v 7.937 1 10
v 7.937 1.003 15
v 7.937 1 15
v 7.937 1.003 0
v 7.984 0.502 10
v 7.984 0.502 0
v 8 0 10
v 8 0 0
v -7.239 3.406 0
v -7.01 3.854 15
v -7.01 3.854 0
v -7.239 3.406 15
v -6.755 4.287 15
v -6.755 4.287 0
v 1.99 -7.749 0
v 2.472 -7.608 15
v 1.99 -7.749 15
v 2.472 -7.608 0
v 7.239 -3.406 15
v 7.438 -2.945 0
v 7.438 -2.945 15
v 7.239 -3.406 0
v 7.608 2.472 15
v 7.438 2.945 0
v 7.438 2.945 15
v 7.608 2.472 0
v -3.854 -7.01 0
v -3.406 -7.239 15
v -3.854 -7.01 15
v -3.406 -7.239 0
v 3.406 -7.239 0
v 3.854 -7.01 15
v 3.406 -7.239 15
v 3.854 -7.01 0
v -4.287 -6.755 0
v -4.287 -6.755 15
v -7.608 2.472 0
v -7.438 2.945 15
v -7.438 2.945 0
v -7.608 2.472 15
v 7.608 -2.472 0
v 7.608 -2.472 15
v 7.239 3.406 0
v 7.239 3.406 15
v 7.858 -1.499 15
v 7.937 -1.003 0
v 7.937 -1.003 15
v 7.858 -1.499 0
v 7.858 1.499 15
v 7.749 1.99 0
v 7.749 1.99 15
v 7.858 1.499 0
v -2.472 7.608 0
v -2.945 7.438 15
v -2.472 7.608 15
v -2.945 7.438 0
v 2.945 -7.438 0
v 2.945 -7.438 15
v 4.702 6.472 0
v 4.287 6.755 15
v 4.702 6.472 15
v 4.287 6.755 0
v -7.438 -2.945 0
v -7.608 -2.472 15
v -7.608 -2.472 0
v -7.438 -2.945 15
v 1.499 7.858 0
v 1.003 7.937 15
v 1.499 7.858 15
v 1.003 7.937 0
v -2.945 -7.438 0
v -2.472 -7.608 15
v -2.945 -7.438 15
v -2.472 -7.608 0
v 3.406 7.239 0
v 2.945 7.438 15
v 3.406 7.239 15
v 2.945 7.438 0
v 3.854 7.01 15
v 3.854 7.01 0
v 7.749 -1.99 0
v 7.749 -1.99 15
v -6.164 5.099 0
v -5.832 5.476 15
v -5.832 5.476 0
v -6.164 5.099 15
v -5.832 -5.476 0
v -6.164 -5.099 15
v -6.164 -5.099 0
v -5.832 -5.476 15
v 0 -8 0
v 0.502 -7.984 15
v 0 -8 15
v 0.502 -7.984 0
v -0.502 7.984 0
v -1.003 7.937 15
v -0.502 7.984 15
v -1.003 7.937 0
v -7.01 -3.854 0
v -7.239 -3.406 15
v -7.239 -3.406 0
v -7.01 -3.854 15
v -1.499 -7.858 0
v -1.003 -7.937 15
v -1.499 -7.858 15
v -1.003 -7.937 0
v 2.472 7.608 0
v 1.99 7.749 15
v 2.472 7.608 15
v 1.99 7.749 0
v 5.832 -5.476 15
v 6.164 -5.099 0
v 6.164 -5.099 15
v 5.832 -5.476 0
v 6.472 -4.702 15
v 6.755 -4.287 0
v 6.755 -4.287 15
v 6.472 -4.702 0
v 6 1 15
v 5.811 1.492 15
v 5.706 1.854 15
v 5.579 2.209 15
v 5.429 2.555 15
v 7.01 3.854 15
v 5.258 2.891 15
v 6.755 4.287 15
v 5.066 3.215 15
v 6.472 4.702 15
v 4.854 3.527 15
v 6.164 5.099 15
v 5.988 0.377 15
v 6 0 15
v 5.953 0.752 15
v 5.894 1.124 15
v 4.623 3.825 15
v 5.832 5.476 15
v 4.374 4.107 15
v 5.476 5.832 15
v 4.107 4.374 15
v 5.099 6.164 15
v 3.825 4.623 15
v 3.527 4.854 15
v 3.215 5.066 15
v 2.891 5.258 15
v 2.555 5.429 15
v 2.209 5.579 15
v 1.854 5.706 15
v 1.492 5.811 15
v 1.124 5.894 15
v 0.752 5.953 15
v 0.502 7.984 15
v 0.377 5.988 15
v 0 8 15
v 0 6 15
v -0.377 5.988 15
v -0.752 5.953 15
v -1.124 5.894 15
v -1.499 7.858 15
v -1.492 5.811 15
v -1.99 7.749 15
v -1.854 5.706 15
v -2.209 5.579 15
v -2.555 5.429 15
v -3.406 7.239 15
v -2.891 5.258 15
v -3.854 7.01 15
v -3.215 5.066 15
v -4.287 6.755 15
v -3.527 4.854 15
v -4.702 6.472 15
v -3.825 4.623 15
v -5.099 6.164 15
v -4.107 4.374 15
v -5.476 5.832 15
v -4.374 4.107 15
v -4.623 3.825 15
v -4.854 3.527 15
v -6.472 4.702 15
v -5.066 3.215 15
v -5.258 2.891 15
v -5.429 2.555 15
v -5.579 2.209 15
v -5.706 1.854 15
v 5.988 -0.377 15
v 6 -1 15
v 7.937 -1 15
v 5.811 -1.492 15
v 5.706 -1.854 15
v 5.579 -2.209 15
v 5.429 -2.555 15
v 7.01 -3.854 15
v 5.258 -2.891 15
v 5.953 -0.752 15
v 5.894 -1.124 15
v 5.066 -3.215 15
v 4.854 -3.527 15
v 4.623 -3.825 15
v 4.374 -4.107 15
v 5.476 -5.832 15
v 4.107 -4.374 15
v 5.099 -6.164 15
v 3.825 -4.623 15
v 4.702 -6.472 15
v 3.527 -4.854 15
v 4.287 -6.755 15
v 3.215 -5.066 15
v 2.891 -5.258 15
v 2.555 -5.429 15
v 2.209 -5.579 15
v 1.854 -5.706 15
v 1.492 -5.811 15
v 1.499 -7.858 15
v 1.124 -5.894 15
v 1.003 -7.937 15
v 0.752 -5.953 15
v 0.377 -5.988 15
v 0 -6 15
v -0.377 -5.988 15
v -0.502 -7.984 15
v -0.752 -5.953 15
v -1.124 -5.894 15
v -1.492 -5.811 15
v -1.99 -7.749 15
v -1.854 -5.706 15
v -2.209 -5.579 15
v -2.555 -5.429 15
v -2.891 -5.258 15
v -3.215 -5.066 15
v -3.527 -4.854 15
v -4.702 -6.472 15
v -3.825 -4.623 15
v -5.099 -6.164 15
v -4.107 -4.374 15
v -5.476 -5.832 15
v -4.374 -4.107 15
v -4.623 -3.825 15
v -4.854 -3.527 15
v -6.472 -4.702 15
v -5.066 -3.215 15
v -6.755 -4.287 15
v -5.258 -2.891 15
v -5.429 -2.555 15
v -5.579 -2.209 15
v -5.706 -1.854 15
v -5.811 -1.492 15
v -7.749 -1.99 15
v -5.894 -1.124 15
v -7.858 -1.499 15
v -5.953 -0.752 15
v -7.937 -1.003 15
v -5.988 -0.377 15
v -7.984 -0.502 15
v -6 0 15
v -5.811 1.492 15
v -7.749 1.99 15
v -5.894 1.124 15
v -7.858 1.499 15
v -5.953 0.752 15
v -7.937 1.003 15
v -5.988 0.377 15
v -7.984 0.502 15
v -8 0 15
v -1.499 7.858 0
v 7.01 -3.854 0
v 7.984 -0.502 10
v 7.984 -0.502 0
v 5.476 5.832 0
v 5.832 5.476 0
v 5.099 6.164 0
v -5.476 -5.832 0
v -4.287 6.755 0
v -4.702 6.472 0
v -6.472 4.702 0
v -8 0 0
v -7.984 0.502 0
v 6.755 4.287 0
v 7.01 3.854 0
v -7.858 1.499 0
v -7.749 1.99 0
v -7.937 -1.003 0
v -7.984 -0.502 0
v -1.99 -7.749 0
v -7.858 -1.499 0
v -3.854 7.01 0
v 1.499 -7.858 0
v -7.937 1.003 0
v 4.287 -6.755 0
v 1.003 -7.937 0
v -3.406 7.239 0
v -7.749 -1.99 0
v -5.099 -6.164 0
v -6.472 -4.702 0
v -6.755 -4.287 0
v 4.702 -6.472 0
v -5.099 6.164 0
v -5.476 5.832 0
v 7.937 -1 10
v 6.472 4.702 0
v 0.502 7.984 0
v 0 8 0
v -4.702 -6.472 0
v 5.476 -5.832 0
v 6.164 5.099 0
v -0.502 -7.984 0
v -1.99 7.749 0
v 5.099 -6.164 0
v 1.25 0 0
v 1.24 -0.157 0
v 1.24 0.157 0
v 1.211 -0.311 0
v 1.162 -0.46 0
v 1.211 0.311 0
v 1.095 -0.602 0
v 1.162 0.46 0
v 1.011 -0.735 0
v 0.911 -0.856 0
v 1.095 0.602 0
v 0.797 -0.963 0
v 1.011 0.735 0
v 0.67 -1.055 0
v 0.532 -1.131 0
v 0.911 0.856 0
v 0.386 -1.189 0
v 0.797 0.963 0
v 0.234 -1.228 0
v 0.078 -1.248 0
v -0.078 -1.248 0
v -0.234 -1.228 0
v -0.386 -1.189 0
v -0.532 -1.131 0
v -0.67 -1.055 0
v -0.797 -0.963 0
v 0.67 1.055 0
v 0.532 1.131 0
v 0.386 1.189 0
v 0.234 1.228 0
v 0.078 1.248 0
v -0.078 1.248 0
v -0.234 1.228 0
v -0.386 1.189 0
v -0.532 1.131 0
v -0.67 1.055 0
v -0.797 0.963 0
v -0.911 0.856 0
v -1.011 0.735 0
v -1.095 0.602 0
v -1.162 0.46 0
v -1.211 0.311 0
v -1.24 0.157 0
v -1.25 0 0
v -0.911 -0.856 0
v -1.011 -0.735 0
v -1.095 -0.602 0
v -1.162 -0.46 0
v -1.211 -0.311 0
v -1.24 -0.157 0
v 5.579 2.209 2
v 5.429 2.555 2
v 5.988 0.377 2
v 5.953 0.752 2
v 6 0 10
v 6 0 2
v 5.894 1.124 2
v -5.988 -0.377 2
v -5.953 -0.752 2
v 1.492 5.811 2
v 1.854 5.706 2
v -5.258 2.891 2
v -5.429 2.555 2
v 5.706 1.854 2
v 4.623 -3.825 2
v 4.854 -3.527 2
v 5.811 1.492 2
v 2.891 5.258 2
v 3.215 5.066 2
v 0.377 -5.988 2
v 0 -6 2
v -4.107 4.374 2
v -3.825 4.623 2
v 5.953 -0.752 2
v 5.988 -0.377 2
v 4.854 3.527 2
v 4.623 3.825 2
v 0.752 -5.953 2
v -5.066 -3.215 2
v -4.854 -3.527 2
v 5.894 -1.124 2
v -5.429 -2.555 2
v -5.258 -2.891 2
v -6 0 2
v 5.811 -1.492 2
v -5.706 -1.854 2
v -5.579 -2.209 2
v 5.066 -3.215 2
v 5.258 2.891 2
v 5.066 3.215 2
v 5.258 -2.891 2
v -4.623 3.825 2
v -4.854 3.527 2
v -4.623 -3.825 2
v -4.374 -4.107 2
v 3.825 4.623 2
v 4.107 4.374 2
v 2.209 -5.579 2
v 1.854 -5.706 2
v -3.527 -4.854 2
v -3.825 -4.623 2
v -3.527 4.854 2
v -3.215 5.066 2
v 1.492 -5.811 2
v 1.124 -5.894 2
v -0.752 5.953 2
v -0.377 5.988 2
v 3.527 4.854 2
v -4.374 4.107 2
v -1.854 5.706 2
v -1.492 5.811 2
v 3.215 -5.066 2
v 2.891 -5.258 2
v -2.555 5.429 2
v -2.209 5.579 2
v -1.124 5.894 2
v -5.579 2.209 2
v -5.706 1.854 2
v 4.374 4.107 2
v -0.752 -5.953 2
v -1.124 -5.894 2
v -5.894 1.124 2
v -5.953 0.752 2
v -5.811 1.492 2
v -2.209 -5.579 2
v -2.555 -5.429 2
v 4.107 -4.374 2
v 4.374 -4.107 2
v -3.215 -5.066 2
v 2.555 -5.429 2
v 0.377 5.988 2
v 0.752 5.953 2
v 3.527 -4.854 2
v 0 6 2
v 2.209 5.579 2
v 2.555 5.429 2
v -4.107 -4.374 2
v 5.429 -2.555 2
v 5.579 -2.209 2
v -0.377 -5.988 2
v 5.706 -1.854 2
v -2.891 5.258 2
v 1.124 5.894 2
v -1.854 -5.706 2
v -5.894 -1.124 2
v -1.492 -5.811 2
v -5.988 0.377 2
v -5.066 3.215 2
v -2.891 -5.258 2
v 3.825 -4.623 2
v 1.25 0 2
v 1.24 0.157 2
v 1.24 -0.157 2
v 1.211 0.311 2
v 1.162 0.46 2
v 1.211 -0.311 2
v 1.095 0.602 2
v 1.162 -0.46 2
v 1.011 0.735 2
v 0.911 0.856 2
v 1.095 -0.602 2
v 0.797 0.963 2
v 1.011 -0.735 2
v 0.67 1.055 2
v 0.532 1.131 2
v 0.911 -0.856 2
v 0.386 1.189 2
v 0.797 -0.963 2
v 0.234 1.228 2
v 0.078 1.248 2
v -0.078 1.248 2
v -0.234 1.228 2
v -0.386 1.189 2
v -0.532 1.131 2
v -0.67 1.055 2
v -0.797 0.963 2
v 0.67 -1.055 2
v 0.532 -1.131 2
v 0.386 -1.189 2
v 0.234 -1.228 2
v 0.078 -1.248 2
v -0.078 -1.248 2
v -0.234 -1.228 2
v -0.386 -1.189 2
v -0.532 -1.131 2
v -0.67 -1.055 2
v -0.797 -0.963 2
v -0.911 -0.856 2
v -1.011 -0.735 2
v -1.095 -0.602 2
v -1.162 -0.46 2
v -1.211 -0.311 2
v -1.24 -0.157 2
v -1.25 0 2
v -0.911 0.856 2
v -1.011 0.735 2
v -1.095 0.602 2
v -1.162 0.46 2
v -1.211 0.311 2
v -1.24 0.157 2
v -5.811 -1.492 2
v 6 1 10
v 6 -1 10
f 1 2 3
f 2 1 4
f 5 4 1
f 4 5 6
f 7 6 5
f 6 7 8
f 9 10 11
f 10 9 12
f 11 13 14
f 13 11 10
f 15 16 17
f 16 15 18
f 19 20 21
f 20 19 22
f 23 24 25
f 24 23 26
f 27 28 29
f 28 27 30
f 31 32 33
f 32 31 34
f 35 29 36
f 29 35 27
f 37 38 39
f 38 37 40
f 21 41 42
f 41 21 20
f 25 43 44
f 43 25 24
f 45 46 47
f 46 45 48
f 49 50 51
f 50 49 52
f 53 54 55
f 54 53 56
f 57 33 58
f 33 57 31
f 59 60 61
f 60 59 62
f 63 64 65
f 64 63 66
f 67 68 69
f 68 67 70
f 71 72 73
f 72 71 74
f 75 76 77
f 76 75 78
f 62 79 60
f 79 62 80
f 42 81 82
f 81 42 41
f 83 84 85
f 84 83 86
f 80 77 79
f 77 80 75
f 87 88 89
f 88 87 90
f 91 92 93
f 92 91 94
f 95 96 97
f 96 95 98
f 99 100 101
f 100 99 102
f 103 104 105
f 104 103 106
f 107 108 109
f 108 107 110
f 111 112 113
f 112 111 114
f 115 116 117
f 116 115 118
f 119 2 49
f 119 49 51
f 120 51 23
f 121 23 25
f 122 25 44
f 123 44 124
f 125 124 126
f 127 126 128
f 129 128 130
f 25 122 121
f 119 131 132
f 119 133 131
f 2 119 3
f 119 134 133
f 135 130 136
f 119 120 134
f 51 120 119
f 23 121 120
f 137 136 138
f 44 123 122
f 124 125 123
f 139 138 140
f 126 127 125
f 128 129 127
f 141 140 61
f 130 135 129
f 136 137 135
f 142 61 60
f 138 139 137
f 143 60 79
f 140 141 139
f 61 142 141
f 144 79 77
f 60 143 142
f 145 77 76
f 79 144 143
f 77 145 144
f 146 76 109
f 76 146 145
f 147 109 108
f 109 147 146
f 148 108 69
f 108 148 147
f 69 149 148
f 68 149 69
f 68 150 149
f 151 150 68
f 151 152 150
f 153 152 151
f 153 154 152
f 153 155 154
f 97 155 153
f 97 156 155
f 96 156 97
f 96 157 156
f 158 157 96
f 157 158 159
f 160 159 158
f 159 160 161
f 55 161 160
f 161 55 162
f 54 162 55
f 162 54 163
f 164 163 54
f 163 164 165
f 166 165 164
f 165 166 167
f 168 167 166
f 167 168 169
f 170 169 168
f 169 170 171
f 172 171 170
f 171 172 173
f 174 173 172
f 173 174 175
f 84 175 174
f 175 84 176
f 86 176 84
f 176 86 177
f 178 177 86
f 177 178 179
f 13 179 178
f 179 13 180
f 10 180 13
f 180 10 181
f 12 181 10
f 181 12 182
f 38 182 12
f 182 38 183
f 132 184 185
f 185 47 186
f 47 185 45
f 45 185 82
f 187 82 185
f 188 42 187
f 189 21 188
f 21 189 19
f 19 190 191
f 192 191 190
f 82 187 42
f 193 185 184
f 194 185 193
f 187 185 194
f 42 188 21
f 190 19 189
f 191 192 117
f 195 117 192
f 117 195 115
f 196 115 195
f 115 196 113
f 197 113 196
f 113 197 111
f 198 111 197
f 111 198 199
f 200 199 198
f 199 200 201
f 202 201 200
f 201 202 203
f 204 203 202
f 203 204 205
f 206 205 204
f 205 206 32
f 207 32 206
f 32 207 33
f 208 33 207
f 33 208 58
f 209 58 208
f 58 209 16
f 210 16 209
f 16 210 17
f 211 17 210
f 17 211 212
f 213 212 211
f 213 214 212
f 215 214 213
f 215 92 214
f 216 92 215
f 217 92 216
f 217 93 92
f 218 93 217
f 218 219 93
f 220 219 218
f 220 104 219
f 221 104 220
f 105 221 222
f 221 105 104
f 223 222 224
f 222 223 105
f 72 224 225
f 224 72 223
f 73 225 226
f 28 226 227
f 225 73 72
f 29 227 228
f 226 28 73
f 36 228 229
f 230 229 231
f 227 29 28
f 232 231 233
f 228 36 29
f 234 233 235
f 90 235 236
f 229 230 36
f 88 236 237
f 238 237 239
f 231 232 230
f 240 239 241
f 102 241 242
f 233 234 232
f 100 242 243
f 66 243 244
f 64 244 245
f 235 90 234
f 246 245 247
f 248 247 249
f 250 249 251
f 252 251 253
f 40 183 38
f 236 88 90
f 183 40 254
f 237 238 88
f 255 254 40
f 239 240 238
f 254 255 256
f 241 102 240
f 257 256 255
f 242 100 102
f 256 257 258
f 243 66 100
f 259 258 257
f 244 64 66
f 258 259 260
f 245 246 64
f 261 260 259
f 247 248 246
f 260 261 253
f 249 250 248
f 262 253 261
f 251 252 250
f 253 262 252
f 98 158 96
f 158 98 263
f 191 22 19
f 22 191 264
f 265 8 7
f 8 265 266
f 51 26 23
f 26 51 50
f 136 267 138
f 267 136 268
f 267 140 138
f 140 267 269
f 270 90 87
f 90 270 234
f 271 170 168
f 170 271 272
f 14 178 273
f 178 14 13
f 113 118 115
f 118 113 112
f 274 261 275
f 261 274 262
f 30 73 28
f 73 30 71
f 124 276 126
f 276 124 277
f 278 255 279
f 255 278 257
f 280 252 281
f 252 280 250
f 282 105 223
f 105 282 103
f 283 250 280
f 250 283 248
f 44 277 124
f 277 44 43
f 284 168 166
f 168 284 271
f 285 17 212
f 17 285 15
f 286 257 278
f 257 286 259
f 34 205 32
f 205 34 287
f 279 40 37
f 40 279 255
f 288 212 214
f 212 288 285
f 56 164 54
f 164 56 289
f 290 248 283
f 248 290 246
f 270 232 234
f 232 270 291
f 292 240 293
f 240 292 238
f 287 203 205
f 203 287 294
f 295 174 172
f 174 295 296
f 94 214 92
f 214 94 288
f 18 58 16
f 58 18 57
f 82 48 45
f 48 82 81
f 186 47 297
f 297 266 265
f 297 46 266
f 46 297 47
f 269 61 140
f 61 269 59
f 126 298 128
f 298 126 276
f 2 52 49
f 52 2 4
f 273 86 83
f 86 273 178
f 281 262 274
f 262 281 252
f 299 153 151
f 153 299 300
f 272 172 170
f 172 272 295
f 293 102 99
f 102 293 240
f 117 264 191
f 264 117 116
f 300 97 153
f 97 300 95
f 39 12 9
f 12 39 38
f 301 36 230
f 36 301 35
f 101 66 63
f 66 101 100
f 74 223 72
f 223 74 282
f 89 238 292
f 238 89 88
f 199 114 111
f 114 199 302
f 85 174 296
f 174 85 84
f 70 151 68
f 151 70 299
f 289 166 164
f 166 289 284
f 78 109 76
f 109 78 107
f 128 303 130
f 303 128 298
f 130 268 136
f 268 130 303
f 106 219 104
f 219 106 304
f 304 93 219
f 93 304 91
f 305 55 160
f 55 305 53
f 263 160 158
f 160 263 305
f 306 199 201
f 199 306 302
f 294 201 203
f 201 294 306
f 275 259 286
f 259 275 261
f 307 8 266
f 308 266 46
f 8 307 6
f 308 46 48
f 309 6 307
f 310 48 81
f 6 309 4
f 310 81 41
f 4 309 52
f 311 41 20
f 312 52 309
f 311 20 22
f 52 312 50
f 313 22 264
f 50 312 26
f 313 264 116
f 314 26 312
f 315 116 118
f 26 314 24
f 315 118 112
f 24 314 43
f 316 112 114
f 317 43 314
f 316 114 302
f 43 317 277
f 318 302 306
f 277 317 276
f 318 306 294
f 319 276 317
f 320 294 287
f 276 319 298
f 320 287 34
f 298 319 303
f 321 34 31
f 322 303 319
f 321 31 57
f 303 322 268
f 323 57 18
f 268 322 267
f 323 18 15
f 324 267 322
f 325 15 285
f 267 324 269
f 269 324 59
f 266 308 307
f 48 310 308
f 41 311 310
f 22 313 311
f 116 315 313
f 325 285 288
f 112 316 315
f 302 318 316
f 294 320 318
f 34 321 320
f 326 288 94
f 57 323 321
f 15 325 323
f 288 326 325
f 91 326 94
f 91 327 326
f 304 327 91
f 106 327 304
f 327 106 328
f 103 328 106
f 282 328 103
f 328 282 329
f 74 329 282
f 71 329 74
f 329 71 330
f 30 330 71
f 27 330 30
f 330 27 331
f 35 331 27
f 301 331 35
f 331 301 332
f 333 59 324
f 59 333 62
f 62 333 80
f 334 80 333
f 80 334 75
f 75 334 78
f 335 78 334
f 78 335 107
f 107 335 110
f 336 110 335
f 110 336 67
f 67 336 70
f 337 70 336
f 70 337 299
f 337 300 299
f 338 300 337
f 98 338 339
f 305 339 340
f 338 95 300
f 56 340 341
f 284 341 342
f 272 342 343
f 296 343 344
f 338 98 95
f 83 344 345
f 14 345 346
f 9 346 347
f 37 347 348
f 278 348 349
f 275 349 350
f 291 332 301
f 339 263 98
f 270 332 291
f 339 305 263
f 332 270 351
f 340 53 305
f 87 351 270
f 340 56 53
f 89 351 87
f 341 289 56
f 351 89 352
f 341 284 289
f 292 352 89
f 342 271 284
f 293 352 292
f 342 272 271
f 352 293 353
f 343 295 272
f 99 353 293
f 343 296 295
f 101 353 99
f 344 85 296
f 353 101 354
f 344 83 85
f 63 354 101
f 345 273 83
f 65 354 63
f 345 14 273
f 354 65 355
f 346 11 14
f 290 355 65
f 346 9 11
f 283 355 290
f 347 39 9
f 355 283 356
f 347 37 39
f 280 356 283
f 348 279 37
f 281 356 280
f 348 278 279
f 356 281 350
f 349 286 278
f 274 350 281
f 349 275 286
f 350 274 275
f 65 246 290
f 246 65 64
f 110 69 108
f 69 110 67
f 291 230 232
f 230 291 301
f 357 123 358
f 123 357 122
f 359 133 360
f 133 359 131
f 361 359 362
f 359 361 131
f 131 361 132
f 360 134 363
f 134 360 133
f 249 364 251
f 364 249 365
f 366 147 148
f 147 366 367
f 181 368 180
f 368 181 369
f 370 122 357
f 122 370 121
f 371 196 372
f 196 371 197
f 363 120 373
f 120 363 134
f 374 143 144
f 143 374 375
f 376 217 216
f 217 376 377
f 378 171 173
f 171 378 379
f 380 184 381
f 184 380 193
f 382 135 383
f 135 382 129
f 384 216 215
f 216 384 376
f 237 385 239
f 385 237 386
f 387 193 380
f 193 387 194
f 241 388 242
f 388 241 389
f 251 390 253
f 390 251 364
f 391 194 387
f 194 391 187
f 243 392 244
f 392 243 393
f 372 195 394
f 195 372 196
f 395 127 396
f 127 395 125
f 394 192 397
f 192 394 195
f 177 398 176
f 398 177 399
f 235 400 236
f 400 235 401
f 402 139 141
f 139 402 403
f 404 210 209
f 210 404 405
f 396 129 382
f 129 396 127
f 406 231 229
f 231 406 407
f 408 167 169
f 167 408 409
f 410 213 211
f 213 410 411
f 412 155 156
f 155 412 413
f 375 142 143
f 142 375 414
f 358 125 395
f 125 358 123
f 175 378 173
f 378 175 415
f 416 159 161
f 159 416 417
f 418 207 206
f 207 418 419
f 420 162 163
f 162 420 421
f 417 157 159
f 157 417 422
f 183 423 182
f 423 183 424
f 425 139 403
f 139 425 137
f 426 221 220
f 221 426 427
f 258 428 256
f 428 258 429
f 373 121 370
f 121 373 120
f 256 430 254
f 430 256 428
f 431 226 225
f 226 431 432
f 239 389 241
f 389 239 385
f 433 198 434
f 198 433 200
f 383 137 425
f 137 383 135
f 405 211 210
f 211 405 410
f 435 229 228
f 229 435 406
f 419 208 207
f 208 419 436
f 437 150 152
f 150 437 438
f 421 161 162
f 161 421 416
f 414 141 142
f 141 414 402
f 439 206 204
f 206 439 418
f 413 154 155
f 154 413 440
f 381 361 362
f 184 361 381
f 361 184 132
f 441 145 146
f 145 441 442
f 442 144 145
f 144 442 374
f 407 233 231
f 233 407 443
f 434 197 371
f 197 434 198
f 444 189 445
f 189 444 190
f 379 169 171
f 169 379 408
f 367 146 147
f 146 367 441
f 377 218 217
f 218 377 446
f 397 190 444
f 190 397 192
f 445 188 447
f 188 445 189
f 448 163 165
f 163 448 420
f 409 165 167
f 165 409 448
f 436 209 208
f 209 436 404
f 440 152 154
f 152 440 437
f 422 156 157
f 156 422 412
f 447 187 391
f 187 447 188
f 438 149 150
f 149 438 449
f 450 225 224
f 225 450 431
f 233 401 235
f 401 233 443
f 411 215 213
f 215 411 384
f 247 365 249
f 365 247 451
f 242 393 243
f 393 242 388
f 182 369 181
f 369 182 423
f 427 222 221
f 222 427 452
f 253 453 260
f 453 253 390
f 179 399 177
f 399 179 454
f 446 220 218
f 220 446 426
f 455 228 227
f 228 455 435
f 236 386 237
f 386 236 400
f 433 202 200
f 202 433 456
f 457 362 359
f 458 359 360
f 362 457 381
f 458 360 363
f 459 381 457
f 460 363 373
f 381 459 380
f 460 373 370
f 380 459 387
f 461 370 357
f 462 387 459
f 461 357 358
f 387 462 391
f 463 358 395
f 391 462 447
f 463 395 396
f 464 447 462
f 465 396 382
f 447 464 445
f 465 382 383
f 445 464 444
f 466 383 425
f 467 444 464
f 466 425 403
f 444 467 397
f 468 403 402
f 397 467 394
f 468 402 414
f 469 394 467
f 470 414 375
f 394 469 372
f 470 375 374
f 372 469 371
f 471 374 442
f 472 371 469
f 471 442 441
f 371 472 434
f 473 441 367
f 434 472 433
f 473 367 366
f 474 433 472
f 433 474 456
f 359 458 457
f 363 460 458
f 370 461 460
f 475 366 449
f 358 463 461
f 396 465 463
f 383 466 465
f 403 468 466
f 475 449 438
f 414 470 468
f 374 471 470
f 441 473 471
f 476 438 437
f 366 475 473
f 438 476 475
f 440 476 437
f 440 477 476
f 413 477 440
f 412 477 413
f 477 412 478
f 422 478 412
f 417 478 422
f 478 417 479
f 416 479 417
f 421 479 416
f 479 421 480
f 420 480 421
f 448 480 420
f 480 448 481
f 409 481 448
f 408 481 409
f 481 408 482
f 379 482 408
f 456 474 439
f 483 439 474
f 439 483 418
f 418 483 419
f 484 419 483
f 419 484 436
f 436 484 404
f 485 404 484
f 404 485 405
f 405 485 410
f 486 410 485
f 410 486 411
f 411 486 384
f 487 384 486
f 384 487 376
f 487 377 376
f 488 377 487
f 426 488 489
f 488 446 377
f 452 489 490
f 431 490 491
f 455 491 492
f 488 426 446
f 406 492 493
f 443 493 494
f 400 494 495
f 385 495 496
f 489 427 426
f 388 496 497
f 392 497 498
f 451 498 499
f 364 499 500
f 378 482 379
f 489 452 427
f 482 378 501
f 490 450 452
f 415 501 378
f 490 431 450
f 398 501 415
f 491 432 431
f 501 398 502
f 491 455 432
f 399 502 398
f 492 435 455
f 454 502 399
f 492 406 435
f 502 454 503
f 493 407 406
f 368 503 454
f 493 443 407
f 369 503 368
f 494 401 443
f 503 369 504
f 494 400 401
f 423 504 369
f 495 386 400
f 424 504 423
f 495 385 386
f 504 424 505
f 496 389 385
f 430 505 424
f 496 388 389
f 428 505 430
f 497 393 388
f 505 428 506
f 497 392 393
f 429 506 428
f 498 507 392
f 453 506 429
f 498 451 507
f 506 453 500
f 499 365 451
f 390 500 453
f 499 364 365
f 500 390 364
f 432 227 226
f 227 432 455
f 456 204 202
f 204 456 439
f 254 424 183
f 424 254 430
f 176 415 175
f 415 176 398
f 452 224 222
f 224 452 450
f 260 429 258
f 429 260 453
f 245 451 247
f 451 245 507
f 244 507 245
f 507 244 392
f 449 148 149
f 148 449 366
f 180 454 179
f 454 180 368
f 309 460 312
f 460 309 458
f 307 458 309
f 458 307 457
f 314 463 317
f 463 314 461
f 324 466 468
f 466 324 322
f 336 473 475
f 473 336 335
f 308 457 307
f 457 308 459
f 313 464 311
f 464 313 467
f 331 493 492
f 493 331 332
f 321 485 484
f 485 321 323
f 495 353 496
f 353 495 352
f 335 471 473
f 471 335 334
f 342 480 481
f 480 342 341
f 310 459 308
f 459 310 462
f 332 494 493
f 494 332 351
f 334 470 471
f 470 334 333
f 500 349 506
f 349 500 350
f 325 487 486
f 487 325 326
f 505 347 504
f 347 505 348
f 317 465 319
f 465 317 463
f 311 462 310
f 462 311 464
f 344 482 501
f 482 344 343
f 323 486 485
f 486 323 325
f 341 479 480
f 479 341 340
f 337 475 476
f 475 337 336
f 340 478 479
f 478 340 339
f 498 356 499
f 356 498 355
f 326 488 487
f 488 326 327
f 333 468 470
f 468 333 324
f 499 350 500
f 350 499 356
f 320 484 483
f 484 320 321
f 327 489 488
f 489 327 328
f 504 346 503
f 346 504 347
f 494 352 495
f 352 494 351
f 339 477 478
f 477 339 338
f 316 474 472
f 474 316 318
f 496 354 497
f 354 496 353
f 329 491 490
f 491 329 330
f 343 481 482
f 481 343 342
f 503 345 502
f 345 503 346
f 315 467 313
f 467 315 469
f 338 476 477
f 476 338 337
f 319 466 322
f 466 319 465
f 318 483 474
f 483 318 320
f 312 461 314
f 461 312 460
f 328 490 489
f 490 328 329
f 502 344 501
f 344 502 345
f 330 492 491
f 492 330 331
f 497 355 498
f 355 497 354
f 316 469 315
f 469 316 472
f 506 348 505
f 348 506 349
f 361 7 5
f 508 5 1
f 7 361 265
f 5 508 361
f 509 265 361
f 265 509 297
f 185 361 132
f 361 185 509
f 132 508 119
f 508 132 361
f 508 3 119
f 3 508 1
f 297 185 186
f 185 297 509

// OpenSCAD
/*
 * Project Cerebrum: Parametric Electrode Holder
 * For custom active-dry electrodes.
 * 
 * This OpenSCAD script generates a modular socket for 
 * gold-plated spring pins and OPA333 active circuitry.
 */

// Parameters
electrode_diameter = 12; // mm
socket_depth = 15;        // mm
wall_thickness = 2;       // mm
pin_hole_diameter = 2.5;  // mm for spring pin

module electrode_socket() {
    difference() {
        // Main Body
        cylinder(h=socket_depth, d=electrode_diameter + (2 * wall_thickness), $fn=100);
        
        // Internal Cavity
        translate([0, 0, wall_thickness])
            cylinder(h=socket_depth, d=electrode_diameter, $fn=100);
            
        // Pin Hole
        cylinder(h=socket_depth, d=pin_hole_diameter, $fn=50);
        
        // Wire Exit Slot
        translate([electrode_diameter/2, -1, socket_depth-5])
            cube([wall_thickness + 2, 2, 5]);
    }
}

// Render
electrode_socket();
